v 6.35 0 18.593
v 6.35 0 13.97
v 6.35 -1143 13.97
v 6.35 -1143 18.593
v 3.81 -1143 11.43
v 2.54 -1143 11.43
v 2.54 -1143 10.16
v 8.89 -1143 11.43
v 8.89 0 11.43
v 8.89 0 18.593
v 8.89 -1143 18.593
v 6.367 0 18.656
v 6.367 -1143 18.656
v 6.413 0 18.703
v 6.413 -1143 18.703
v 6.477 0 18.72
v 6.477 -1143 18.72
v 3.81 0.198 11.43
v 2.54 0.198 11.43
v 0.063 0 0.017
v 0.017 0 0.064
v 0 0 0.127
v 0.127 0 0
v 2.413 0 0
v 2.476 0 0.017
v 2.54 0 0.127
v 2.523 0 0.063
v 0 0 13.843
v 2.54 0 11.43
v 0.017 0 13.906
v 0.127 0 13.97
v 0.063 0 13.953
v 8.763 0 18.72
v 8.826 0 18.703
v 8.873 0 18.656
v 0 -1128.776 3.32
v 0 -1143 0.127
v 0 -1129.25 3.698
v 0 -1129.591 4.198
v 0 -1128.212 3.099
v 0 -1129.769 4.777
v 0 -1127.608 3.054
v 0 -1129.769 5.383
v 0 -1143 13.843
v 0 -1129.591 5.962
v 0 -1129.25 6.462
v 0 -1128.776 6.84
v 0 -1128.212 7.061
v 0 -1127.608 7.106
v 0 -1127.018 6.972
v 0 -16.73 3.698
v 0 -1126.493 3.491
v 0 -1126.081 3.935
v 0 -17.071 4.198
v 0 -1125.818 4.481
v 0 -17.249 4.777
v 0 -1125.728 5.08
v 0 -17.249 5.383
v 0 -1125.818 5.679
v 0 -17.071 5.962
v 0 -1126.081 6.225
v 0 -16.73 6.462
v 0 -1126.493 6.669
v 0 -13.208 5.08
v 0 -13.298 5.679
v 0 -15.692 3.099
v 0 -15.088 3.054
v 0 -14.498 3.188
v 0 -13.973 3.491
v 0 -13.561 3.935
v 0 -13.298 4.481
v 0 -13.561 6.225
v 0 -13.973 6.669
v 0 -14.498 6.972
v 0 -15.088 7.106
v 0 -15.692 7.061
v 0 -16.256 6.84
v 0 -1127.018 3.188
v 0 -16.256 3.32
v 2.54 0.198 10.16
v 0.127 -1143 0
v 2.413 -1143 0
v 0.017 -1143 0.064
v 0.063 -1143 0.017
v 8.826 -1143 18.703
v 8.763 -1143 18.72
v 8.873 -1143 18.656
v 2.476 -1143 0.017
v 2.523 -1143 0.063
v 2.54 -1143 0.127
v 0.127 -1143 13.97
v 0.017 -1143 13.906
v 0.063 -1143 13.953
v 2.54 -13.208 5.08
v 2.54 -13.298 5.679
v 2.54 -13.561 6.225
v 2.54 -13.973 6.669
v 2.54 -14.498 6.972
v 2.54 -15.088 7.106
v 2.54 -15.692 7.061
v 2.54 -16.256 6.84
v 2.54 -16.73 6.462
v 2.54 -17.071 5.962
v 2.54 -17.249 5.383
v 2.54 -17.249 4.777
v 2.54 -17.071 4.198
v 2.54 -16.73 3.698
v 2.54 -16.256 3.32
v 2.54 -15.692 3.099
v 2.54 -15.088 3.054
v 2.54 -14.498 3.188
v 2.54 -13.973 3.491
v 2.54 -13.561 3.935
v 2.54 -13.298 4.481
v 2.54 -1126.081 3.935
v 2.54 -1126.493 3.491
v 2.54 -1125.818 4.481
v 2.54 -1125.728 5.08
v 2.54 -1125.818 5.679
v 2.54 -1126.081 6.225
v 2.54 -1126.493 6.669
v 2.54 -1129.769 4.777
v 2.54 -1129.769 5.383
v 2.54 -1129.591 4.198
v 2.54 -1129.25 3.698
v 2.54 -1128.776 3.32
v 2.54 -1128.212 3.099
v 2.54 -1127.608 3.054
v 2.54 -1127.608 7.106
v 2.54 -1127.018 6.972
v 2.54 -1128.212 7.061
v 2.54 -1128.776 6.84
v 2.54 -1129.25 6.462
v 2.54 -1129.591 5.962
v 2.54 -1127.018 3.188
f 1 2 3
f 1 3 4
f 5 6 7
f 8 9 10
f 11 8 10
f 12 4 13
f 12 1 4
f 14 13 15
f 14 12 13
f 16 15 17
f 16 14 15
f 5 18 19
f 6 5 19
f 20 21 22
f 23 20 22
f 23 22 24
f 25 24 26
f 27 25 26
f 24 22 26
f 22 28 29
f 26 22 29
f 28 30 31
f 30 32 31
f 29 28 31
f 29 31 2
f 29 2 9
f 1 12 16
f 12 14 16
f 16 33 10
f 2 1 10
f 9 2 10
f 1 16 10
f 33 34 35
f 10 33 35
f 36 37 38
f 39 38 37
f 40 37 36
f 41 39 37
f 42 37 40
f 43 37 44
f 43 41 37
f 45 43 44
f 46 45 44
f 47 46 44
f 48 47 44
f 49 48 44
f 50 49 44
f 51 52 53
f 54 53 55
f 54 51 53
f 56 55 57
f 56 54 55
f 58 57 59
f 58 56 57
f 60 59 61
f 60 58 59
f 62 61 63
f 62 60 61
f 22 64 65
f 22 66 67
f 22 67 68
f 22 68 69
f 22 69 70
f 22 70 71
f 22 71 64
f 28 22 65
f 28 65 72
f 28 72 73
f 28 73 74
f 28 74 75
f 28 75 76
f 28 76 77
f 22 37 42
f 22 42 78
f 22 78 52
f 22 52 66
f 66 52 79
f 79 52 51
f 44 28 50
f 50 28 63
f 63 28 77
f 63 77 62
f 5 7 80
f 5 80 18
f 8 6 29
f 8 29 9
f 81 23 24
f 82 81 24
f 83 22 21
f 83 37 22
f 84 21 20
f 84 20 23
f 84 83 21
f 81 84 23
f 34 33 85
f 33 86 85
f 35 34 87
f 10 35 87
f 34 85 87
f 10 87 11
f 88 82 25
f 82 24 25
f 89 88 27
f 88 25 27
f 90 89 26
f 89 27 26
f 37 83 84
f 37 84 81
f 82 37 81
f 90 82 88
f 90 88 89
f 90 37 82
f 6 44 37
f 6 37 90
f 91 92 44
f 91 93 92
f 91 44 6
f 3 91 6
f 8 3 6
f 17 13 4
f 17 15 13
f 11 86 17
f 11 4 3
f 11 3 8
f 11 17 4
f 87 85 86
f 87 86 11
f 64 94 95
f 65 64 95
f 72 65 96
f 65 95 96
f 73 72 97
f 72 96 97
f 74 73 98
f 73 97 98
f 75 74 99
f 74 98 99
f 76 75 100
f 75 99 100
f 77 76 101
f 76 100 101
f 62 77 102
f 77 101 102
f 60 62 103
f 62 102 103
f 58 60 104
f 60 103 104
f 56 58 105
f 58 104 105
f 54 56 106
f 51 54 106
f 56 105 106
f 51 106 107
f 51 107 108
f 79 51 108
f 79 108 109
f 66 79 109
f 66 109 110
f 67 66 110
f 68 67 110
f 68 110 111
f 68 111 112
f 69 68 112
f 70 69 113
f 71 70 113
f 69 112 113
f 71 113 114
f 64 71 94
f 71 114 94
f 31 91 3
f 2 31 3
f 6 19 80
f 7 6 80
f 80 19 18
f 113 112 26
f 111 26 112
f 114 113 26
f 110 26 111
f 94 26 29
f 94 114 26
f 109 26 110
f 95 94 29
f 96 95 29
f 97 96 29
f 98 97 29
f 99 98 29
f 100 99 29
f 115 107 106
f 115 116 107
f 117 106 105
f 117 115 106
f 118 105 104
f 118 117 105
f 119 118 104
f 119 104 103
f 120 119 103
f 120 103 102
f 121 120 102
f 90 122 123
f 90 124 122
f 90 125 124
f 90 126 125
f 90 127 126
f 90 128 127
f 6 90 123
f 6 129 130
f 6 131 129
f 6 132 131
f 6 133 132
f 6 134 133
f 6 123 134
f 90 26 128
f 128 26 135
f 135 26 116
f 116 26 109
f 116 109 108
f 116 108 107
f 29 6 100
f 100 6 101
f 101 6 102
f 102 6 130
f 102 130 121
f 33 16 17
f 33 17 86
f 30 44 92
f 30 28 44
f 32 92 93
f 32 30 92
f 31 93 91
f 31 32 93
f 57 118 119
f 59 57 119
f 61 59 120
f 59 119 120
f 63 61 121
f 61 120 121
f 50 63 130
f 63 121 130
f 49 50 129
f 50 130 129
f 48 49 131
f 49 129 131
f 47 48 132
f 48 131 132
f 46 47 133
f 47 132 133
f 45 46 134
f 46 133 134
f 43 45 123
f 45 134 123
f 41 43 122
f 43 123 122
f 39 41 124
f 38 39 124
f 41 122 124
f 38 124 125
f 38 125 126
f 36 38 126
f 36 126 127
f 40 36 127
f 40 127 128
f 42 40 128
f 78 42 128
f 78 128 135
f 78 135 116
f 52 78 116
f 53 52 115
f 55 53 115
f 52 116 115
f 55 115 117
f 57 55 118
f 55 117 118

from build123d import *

# Parameters (mm, degrees)
F0_W     = 8.89
F0_H     = 18.7198
F1_DEPTH = 1143
F2_W     = 6.35
F2_H     = 4.7498
F2_H_2   = 11.43
F3_DEPTH = 1143.001
F4_R     = 0.127
F6_DEPTH = 1143.001
F7_R     = 2.032
F8_DEPTH = 2.54


# Not quite as in the source:
# - a pattern or mirror of a feature is missing from the dataset's text; its kind, count and spacing are read off the source's solid


with BuildPart() as f1:
    # F0 (on Front) → F1 (new body)
    with BuildSketch(Plane.XZ):
        with Locations((4.445, 9.3599)):
            Rectangle(F0_W, F0_H)
    extrude(amount=F1_DEPTH)

    # F2 (on face) → F3 (cut, through all)
    with BuildSketch(Plane.XZ.offset(1143)):
        with Locations((3.175, 16.3449)):
            Rectangle(F2_W, F2_H)
        with Locations((5.715, 5.715)):
            Rectangle(F2_W, F2_H_2)
    extrude(amount=-F3_DEPTH, mode=Mode.SUBTRACT)

    # F4
    f4_edges = [f1.edges().sort_by_distance(p)[0] for p in [
        (6.35, -571.5, 18.7198),
        (8.89, -571.5, 18.7198),
        (2.54, -571.5, 0),
        (0, -571.5, 0),
        (0, -571.5, 13.97),
    ]]
    fillet(f4_edges, radius=F4_R)

    # F7 (on face) → F8 (cut, through all)
    with BuildSketch(Plane.YZ.offset(2.54)):
        with Locations((-1127.76, 5.08)):
            Circle(F7_R)
        with Locations((-15.24, 5.08)):
            Circle(F7_R)
    extrude(amount=-F8_DEPTH, mode=Mode.SUBTRACT)


with BuildPart() as f6:
    # F5 (on face) → F6 (new body, through all)
    with BuildSketch(Plane.XZ.offset(1143)):
        Polygon((2.54, 10.16), (3.81, 11.43), (2.54, 11.43), align=None)
    extrude(amount=-F6_DEPTH)

    # F6_copies: F6 across plane


with BuildPart() as f6_1:
    add(f6.part)
    add(f6.part.mirror(Plane.ZX.offset(-571.401074)))


solid = Compound([f1.part, f6_1.part])
